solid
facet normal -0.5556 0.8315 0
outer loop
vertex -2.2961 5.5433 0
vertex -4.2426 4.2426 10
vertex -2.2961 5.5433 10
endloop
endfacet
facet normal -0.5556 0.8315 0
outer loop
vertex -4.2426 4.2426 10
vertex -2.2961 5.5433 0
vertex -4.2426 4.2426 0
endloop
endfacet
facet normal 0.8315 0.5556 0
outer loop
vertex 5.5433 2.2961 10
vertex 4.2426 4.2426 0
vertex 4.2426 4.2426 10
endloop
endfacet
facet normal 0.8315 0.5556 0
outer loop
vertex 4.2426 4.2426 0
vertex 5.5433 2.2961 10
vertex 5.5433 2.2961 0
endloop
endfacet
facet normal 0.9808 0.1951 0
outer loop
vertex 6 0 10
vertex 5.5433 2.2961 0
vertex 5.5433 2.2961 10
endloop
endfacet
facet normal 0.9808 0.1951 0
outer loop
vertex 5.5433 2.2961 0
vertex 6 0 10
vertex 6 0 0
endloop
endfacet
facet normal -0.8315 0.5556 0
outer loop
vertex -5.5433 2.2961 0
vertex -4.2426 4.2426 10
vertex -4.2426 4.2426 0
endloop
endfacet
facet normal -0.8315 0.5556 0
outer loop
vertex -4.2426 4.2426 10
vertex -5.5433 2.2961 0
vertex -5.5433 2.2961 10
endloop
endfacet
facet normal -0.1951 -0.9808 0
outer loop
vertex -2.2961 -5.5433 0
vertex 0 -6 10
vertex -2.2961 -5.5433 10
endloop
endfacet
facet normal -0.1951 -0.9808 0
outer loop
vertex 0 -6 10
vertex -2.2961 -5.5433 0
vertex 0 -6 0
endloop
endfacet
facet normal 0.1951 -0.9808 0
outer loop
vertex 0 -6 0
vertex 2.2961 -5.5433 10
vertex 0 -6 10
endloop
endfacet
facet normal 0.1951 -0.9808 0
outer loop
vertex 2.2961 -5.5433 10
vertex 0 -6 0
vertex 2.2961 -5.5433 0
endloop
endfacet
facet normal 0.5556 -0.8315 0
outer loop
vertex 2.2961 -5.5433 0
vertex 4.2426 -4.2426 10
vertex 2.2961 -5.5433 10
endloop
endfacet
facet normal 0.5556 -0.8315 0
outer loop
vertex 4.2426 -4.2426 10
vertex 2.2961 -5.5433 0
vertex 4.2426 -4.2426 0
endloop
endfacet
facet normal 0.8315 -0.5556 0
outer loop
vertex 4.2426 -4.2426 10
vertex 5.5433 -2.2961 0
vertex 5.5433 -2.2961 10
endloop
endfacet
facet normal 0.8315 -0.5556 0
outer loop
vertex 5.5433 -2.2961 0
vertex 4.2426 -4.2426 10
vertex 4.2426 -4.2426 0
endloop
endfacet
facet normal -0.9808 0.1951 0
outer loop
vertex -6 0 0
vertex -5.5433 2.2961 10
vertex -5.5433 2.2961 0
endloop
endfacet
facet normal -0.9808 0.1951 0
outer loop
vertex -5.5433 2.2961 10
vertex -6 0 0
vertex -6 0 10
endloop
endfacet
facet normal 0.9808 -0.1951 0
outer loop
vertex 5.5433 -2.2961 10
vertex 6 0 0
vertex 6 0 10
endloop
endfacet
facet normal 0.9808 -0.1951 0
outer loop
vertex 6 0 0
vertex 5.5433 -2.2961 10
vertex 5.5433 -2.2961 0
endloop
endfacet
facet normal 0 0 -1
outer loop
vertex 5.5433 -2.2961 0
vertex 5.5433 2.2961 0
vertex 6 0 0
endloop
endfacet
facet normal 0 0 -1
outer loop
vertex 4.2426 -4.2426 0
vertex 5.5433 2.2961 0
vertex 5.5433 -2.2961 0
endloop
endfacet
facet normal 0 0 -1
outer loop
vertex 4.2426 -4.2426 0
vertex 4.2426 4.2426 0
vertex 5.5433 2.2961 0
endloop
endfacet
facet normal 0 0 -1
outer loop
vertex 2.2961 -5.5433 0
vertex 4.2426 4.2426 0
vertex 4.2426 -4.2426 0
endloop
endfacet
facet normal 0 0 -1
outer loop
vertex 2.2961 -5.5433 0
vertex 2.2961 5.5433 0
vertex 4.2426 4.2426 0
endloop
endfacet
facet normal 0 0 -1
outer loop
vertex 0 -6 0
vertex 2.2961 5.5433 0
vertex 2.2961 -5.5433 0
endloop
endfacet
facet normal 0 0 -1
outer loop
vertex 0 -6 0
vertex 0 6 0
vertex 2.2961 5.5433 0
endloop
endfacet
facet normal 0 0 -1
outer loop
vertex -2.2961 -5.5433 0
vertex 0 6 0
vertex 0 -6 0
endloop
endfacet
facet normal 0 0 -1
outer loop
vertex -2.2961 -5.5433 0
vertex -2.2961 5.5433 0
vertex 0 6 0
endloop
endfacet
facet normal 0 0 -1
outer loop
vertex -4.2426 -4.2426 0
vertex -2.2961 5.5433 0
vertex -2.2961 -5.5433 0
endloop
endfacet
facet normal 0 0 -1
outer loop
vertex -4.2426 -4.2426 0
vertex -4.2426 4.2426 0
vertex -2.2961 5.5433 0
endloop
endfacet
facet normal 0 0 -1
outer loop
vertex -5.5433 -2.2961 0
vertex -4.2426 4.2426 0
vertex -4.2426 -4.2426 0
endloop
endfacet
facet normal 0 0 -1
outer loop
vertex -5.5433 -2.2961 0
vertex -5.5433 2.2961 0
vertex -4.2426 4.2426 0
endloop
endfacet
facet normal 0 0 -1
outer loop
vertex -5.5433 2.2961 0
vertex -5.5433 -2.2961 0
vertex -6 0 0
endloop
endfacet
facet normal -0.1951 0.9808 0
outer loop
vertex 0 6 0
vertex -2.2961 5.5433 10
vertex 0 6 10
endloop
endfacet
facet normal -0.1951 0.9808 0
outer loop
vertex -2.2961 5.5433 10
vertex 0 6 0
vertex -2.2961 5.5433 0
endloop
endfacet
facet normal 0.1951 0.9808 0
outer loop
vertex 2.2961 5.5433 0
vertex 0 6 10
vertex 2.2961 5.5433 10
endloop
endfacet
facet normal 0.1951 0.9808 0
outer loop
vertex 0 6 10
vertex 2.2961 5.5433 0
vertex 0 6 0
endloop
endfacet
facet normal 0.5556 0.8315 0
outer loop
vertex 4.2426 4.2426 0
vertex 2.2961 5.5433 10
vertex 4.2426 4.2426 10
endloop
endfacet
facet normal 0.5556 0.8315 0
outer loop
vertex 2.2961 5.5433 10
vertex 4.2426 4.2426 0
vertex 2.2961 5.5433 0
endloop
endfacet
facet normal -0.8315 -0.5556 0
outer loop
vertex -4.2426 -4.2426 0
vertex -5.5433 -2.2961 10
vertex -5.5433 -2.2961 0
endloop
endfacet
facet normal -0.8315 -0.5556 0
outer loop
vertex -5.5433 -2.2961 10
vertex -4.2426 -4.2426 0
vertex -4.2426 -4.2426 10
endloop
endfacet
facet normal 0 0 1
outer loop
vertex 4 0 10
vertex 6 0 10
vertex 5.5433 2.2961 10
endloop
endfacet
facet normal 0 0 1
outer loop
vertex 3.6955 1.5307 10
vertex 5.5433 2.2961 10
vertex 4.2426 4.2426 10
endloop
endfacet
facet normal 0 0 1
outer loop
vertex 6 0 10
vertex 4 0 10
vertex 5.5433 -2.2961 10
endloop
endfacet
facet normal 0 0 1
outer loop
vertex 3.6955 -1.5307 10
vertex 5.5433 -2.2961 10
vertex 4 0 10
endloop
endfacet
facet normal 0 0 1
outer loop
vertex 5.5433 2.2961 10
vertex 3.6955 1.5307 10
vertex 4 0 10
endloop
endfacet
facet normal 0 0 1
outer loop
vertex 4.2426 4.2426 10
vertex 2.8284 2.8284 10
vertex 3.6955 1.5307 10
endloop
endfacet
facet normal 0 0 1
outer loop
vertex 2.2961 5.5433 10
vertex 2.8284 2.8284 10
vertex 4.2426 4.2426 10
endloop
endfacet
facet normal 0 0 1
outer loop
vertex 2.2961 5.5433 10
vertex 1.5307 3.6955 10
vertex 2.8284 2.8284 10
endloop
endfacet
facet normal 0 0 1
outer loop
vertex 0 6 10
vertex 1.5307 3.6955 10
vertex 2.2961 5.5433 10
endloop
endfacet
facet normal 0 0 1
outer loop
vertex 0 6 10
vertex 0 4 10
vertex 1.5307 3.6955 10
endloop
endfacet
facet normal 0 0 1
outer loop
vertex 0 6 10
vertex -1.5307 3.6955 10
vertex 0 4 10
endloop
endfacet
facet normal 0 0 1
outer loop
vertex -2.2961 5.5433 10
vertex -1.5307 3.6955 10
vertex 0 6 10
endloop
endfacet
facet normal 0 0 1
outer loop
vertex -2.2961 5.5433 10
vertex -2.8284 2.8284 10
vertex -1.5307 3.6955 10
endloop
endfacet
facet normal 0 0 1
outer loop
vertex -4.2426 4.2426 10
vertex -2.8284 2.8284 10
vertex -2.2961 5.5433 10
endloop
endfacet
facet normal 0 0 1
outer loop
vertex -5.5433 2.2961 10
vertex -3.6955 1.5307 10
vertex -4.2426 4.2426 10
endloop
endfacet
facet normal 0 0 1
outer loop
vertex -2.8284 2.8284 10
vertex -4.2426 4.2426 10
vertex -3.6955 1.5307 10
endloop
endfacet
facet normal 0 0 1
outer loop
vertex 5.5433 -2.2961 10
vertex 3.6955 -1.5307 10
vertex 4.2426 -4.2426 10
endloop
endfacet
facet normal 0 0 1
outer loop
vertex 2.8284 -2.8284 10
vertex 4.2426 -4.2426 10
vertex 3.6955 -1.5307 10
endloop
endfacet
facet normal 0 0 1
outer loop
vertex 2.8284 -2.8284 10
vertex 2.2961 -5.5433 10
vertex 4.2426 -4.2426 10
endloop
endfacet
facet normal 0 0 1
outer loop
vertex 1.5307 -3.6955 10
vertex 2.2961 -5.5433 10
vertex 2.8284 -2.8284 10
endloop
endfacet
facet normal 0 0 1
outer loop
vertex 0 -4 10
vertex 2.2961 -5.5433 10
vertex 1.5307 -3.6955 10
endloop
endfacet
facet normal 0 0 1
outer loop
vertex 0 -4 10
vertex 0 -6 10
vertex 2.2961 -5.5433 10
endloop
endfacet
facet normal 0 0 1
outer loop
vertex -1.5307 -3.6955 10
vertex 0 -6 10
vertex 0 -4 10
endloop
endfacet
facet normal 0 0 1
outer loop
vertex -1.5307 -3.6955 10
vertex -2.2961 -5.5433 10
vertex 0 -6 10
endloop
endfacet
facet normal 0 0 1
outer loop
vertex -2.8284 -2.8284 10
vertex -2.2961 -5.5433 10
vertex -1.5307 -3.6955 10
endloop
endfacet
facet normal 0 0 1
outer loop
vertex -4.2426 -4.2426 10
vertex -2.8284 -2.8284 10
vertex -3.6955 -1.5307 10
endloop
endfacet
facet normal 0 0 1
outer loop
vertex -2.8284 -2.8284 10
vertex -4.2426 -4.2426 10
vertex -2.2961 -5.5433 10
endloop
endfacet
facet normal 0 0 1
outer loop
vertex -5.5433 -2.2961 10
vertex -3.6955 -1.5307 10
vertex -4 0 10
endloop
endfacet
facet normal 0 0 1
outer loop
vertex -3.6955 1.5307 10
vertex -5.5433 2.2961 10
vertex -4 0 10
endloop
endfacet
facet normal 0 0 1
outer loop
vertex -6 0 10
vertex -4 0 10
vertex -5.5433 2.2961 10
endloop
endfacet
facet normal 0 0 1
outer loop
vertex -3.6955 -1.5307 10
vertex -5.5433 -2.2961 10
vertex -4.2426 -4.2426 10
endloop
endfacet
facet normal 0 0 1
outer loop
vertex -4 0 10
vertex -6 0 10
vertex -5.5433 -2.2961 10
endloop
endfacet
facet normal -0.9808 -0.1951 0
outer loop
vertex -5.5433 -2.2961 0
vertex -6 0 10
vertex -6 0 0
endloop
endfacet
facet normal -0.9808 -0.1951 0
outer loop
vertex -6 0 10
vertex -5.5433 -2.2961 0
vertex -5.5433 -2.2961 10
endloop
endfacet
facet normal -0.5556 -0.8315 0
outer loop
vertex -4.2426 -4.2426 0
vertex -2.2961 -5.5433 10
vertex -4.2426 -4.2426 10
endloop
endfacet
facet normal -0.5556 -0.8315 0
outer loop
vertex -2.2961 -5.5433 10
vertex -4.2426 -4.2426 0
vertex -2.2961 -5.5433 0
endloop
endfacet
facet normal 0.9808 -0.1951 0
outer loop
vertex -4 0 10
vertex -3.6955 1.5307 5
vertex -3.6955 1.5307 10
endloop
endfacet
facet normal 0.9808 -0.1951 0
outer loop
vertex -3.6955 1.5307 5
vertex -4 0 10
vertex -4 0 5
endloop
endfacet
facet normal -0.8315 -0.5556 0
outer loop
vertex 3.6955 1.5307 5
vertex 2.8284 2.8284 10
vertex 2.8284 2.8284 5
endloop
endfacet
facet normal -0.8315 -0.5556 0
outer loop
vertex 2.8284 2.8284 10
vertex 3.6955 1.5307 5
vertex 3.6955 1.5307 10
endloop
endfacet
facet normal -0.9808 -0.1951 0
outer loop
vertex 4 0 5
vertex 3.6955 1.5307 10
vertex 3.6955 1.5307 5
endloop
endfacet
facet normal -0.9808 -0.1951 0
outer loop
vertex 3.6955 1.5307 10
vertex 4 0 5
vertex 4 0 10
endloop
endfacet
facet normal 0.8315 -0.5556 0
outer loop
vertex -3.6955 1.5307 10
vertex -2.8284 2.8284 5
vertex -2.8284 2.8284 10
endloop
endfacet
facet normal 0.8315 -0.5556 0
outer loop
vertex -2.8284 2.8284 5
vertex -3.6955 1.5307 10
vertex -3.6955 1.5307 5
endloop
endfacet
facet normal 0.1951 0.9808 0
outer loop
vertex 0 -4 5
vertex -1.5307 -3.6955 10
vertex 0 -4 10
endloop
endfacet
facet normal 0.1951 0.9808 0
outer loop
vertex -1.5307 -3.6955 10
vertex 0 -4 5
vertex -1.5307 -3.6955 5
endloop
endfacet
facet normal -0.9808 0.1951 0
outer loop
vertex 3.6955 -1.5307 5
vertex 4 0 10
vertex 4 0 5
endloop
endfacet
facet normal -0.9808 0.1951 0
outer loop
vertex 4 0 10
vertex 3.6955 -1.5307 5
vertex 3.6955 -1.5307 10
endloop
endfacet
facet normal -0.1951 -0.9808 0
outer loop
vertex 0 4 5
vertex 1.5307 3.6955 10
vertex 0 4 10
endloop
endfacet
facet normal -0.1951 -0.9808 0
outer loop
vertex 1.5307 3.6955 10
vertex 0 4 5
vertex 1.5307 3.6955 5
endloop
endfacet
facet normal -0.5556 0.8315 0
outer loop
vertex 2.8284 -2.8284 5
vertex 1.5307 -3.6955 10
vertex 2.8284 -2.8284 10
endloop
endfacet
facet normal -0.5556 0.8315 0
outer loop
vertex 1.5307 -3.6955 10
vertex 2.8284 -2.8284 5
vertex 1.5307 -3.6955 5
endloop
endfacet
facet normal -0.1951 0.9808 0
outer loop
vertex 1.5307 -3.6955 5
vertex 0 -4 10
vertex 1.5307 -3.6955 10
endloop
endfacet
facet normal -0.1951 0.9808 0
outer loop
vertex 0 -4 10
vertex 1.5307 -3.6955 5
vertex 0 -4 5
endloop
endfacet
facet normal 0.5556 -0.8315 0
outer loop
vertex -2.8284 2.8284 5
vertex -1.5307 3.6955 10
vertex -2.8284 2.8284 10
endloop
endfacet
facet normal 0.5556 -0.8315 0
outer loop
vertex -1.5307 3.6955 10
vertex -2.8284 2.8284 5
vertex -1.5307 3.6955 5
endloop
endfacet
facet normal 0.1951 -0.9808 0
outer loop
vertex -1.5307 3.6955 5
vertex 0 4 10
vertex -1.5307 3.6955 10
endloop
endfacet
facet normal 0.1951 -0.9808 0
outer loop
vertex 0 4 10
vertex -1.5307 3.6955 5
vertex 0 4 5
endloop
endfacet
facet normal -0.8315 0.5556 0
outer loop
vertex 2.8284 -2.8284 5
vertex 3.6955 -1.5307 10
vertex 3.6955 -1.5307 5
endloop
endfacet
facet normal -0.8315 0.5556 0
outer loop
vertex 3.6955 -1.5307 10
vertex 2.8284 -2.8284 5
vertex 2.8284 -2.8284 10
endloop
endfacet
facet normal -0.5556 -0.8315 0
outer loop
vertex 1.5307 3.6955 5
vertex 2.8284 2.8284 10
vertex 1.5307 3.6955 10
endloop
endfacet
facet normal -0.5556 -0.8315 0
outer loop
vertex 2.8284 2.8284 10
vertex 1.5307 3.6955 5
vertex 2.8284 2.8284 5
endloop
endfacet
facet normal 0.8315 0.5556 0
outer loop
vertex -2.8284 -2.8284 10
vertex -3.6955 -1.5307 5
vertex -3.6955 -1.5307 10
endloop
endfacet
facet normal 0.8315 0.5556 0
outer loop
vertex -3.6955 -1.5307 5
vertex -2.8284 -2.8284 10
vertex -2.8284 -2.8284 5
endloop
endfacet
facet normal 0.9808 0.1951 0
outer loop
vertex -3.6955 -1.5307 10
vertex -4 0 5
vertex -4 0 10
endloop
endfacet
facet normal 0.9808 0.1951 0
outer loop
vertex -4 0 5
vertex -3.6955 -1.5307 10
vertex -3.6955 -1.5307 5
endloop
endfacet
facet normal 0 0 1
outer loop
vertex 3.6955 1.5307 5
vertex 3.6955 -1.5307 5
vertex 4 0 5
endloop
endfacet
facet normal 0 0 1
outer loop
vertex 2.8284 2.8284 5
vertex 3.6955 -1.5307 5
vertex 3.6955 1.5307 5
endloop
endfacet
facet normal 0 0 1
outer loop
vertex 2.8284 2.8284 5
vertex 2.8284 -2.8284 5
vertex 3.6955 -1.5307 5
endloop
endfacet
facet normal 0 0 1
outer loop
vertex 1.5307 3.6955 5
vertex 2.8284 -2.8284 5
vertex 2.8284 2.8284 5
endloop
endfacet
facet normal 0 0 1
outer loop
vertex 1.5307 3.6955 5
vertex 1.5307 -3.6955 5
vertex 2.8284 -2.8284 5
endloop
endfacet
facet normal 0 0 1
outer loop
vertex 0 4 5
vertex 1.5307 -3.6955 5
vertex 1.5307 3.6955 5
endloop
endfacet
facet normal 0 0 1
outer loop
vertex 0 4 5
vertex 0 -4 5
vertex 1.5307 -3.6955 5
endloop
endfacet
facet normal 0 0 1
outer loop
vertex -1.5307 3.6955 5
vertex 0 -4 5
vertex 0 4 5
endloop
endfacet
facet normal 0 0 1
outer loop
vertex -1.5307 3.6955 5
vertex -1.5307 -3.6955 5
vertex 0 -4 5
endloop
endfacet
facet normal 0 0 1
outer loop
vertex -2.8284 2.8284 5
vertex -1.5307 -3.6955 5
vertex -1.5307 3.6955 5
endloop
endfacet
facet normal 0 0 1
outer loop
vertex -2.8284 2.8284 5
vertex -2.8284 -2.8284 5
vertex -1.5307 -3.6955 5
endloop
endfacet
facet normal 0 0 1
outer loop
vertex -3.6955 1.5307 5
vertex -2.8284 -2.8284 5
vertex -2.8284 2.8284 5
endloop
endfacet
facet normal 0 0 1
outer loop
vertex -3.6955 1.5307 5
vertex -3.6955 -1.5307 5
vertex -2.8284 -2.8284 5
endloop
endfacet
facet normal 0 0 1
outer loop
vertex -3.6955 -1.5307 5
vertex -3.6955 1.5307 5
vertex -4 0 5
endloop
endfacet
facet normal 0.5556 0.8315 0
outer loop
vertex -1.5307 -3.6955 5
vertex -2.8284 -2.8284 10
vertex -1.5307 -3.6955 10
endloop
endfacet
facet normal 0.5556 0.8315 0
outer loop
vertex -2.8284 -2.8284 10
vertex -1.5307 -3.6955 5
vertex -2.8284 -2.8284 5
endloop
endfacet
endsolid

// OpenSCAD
// a foot to go onto a 5/16" bolt (AMD)
// bolt shaft is 7.5-8 mm across

shaft_diameter = 8;
shaft_depth = 5;
foot_diameter = 1.5*shaft_diameter;

difference() {
    cylinder(h=2*shaft_depth, d=foot_diameter, center=false, $fn=16);
    translate([0, 0, shaft_depth])
        cylinder(h=shaft_depth+0.1, d=shaft_diameter, center=false, $fn=16);
}
